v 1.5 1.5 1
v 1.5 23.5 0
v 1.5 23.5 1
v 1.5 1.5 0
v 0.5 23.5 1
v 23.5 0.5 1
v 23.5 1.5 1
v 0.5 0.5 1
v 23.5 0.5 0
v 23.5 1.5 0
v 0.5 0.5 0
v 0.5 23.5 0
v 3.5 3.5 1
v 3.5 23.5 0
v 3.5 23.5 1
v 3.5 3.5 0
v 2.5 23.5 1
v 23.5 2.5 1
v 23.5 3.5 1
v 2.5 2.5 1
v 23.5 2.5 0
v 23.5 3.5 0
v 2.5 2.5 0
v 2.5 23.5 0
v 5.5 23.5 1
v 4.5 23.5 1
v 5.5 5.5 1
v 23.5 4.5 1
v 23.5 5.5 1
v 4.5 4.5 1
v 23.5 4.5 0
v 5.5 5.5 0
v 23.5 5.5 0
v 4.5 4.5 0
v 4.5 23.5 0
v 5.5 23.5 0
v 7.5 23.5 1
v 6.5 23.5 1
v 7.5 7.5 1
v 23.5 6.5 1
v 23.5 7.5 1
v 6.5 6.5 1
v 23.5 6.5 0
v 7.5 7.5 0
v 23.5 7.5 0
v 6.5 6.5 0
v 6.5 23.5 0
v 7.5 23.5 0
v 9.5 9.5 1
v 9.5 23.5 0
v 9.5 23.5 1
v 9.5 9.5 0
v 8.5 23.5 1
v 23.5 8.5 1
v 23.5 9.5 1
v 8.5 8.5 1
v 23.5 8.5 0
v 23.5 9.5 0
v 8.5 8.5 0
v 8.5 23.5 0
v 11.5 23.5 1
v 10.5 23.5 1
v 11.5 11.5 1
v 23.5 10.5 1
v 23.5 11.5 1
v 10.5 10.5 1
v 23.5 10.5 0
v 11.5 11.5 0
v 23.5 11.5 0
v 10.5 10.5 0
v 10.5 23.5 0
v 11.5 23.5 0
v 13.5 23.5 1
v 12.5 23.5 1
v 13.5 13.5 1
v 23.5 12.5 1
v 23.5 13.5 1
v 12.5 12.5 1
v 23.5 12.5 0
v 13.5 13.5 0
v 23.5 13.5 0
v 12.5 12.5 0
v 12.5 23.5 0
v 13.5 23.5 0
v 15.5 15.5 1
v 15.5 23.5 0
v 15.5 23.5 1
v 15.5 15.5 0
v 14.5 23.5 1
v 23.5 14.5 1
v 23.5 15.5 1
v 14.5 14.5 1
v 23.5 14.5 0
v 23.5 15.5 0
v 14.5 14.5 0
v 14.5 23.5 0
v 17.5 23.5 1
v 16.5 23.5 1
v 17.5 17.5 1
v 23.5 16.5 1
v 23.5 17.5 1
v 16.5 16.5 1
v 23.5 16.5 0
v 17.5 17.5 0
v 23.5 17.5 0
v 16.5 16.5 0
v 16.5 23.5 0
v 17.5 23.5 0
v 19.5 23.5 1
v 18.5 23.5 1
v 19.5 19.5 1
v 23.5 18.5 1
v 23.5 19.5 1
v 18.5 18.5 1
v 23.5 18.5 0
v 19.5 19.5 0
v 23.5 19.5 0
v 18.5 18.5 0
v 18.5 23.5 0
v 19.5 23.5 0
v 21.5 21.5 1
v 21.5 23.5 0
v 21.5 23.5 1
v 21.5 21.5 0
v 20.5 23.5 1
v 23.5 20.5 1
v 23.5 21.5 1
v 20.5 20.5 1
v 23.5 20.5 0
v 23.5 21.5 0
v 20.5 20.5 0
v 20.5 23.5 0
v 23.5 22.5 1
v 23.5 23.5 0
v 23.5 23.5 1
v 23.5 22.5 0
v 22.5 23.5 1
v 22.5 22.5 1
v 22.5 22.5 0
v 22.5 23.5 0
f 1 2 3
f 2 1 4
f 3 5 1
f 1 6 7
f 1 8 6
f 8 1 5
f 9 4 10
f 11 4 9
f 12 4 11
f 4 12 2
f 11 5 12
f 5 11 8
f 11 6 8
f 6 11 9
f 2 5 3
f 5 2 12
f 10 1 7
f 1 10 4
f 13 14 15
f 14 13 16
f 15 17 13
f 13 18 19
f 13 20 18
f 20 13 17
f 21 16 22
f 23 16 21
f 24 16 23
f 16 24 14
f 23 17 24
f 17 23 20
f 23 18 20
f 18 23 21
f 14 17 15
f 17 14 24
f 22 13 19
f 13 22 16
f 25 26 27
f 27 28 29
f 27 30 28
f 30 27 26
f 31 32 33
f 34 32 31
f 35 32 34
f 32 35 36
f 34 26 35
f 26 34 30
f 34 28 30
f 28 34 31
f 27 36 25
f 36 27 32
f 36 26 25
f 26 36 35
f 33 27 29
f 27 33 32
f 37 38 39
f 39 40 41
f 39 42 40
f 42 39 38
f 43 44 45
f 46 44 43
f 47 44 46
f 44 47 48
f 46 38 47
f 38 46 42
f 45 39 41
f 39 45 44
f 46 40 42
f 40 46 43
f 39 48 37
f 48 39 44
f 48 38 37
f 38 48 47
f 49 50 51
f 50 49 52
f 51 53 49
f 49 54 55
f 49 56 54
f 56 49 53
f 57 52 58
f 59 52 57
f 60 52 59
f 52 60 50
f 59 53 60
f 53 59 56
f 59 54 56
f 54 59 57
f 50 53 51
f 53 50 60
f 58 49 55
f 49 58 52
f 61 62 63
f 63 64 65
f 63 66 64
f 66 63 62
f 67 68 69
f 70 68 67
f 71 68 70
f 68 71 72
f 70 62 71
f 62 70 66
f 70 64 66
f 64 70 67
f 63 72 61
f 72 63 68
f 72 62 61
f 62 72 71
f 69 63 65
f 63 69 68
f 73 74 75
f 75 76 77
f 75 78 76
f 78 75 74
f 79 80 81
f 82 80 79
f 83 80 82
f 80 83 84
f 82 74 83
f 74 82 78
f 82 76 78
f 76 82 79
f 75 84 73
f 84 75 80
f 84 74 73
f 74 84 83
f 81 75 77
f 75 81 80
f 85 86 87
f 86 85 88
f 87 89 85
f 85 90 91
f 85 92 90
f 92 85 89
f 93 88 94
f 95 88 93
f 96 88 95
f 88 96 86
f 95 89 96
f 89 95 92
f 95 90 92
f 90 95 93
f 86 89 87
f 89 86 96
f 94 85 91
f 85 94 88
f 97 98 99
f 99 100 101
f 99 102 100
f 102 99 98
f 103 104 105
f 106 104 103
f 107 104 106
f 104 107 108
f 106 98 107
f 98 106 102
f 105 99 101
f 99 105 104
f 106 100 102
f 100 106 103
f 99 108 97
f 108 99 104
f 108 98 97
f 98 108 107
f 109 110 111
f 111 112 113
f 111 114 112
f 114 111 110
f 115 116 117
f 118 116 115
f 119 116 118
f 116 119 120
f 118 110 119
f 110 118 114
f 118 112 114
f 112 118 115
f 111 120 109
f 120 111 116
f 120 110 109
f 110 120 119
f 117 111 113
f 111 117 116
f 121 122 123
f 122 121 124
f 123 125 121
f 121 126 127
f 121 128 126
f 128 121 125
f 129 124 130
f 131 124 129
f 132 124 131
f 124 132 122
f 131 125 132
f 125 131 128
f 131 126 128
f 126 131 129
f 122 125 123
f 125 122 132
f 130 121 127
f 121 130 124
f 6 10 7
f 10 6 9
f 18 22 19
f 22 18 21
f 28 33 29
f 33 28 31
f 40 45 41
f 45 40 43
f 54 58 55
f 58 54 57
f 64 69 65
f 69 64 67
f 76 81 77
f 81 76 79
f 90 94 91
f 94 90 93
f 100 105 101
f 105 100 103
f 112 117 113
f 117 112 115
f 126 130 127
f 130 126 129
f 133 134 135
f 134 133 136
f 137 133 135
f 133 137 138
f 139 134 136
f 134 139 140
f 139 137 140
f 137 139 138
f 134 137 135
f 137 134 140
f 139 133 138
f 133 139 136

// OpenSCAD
union() {
    translate([1, 1, 0.5]) cube([1, 1, 1], center=true);
    translate([1, 2, 0.5]) cube([1, 1, 1], center=true);
    translate([1, 3, 0.5]) cube([1, 1, 1], center=true);
    translate([1, 4, 0.5]) cube([1, 1, 1], center=true);
    translate([1, 5, 0.5]) cube([1, 1, 1], center=true);
    translate([1, 6, 0.5]) cube([1, 1, 1], center=true);
    translate([1, 7, 0.5]) cube([1, 1, 1], center=true);
    translate([1, 8, 0.5]) cube([1, 1, 1], center=true);
    translate([1, 9, 0.5]) cube([1, 1, 1], center=true);
    translate([1, 10, 0.5]) cube([1, 1, 1], center=true);
    translate([1, 11, 0.5]) cube([1, 1, 1], center=true);
    translate([1, 12, 0.5]) cube([1, 1, 1], center=true);
    translate([1, 13, 0.5]) cube([1, 1, 1], center=true);
    translate([1, 14, 0.5]) cube([1, 1, 1], center=true);
    translate([1, 15, 0.5]) cube([1, 1, 1], center=true);
    translate([1, 16, 0.5]) cube([1, 1, 1], center=true);
    translate([1, 17, 0.5]) cube([1, 1, 1], center=true);
    translate([1, 18, 0.5]) cube([1, 1, 1], center=true);
    translate([1, 19, 0.5]) cube([1, 1, 1], center=true);
    translate([1, 20, 0.5]) cube([1, 1, 1], center=true);
    translate([1, 21, 0.5]) cube([1, 1, 1], center=true);
    translate([1, 22, 0.5]) cube([1, 1, 1], center=true);
    translate([1, 23, 0.5]) cube([1, 1, 1], center=true);
    translate([2, 1, 0.5]) cube([1, 1, 1], center=true);
    translate([3, 1, 0.5]) cube([1, 1, 1], center=true);
    translate([3, 3, 0.5]) cube([1, 1, 1], center=true);
    translate([3, 4, 0.5]) cube([1, 1, 1], center=true);
    translate([3, 5, 0.5]) cube([1, 1, 1], center=true);
    translate([3, 6, 0.5]) cube([1, 1, 1], center=true);
    translate([3, 7, 0.5]) cube([1, 1, 1], center=true);
    translate([3, 8, 0.5]) cube([1, 1, 1], center=true);
    translate([3, 9, 0.5]) cube([1, 1, 1], center=true);
    translate([3, 10, 0.5]) cube([1, 1, 1], center=true);
    translate([3, 11, 0.5]) cube([1, 1, 1], center=true);
    translate([3, 12, 0.5]) cube([1, 1, 1], center=true);
    translate([3, 13, 0.5]) cube([1, 1, 1], center=true);
    translate([3, 14, 0.5]) cube([1, 1, 1], center=true);
    translate([3, 15, 0.5]) cube([1, 1, 1], center=true);
    translate([3, 16, 0.5]) cube([1, 1, 1], center=true);
    translate([3, 17, 0.5]) cube([1, 1, 1], center=true);
    translate([3, 18, 0.5]) cube([1, 1, 1], center=true);
    translate([3, 19, 0.5]) cube([1, 1, 1], center=true);
    translate([3, 20, 0.5]) cube([1, 1, 1], center=true);
    translate([3, 21, 0.5]) cube([1, 1, 1], center=true);
    translate([3, 22, 0.5]) cube([1, 1, 1], center=true);
    translate([3, 23, 0.5]) cube([1, 1, 1], center=true);
    translate([4, 1, 0.5]) cube([1, 1, 1], center=true);
    translate([4, 3, 0.5]) cube([1, 1, 1], center=true);
    translate([5, 1, 0.5]) cube([1, 1, 1], center=true);
    translate([5, 3, 0.5]) cube([1, 1, 1], center=true);
    translate([5, 5, 0.5]) cube([1, 1, 1], center=true);
    translate([5, 6, 0.5]) cube([1, 1, 1], center=true);
    translate([5, 7, 0.5]) cube([1, 1, 1], center=true);
    translate([5, 8, 0.5]) cube([1, 1, 1], center=true);
    translate([5, 9, 0.5]) cube([1, 1, 1], center=true);
    translate([5, 10, 0.5]) cube([1, 1, 1], center=true);
    translate([5, 11, 0.5]) cube([1, 1, 1], center=true);
    translate([5, 12, 0.5]) cube([1, 1, 1], center=true);
    translate([5, 13, 0.5]) cube([1, 1, 1], center=true);
    translate([5, 14, 0.5]) cube([1, 1, 1], center=true);
    translate([5, 15, 0.5]) cube([1, 1, 1], center=true);
    translate([5, 16, 0.5]) cube([1, 1, 1], center=true);
    translate([5, 17, 0.5]) cube([1, 1, 1], center=true);
    translate([5, 18, 0.5]) cube([1, 1, 1], center=true);
    translate([5, 19, 0.5]) cube([1, 1, 1], center=true);
    translate([5, 20, 0.5]) cube([1, 1, 1], center=true);
    translate([5, 21, 0.5]) cube([1, 1, 1], center=true);
    translate([5, 22, 0.5]) cube([1, 1, 1], center=true);
    translate([5, 23, 0.5]) cube([1, 1, 1], center=true);
    translate([6, 1, 0.5]) cube([1, 1, 1], center=true);
    translate([6, 3, 0.5]) cube([1, 1, 1], center=true);
    translate([6, 5, 0.5]) cube([1, 1, 1], center=true);
    translate([7, 1, 0.5]) cube([1, 1, 1], center=true);
    translate([7, 3, 0.5]) cube([1, 1, 1], center=true);
    translate([7, 5, 0.5]) cube([1, 1, 1], center=true);
    translate([7, 7, 0.5]) cube([1, 1, 1], center=true);
    translate([7, 8, 0.5]) cube([1, 1, 1], center=true);
    translate([7, 9, 0.5]) cube([1, 1, 1], center=true);
    translate([7, 10, 0.5]) cube([1, 1, 1], center=true);
    translate([7, 11, 0.5]) cube([1, 1, 1], center=true);
    translate([7, 12, 0.5]) cube([1, 1, 1], center=true);
    translate([7, 13, 0.5]) cube([1, 1, 1], center=true);
    translate([7, 14, 0.5]) cube([1, 1, 1], center=true);
    translate([7, 15, 0.5]) cube([1, 1, 1], center=true);
    translate([7, 16, 0.5]) cube([1, 1, 1], center=true);
    translate([7, 17, 0.5]) cube([1, 1, 1], center=true);
    translate([7, 18, 0.5]) cube([1, 1, 1], center=true);
    translate([7, 19, 0.5]) cube([1, 1, 1], center=true);
    translate([7, 20, 0.5]) cube([1, 1, 1], center=true);
    translate([7, 21, 0.5]) cube([1, 1, 1], center=true);
    translate([7, 22, 0.5]) cube([1, 1, 1], center=true);
    translate([7, 23, 0.5]) cube([1, 1, 1], center=true);
    translate([8, 1, 0.5]) cube([1, 1, 1], center=true);
    translate([8, 3, 0.5]) cube([1, 1, 1], center=true);
    translate([8, 5, 0.5]) cube([1, 1, 1], center=true);
    translate([8, 7, 0.5]) cube([1, 1, 1], center=true);
    translate([9, 1, 0.5]) cube([1, 1, 1], center=true);
    translate([9, 3, 0.5]) cube([1, 1, 1], center=true);
    translate([9, 5, 0.5]) cube([1, 1, 1], center=true);
    translate([9, 7, 0.5]) cube([1, 1, 1], center=true);
    translate([9, 9, 0.5]) cube([1, 1, 1], center=true);
    translate([9, 10, 0.5]) cube([1, 1, 1], center=true);
    translate([9, 11, 0.5]) cube([1, 1, 1], center=true);
    translate([9, 12, 0.5]) cube([1, 1, 1], center=true);
    translate([9, 13, 0.5]) cube([1, 1, 1], center=true);
    translate([9, 14, 0.5]) cube([1, 1, 1], center=true);
    translate([9, 15, 0.5]) cube([1, 1, 1], center=true);
    translate([9, 16, 0.5]) cube([1, 1, 1], center=true);
    translate([9, 17, 0.5]) cube([1, 1, 1], center=true);
    translate([9, 18, 0.5]) cube([1, 1, 1], center=true);
    translate([9, 19, 0.5]) cube([1, 1, 1], center=true);
    translate([9, 20, 0.5]) cube([1, 1, 1], center=true);
    translate([9, 21, 0.5]) cube([1, 1, 1], center=true);
    translate([9, 22, 0.5]) cube([1, 1, 1], center=true);
    translate([9, 23, 0.5]) cube([1, 1, 1], center=true);
    translate([10, 1, 0.5]) cube([1, 1, 1], center=true);
    translate([10, 3, 0.5]) cube([1, 1, 1], center=true);
    translate([10, 5, 0.5]) cube([1, 1, 1], center=true);
    translate([10, 7, 0.5]) cube([1, 1, 1], center=true);
    translate([10, 9, 0.5]) cube([1, 1, 1], center=true);
    translate([11, 1, 0.5]) cube([1, 1, 1], center=true);
    translate([11, 3, 0.5]) cube([1, 1, 1], center=true);
    translate([11, 5, 0.5]) cube([1, 1, 1], center=true);
    translate([11, 7, 0.5]) cube([1, 1, 1], center=true);
    translate([11, 9, 0.5]) cube([1, 1, 1], center=true);
    translate([11, 11, 0.5]) cube([1, 1, 1], center=true);
    translate([11, 12, 0.5]) cube([1, 1, 1], center=true);
    translate([11, 13, 0.5]) cube([1, 1, 1], center=true);
    translate([11, 14, 0.5]) cube([1, 1, 1], center=true);
    translate([11, 15, 0.5]) cube([1, 1, 1], center=true);
    translate([11, 16, 0.5]) cube([1, 1, 1], center=true);
    translate([11, 17, 0.5]) cube([1, 1, 1], center=true);
    translate([11, 18, 0.5]) cube([1, 1, 1], center=true);
    translate([11, 19, 0.5]) cube([1, 1, 1], center=true);
    translate([11, 20, 0.5]) cube([1, 1, 1], center=true);
    translate([11, 21, 0.5]) cube([1, 1, 1], center=true);
    translate([11, 22, 0.5]) cube([1, 1, 1], center=true);
    translate([11, 23, 0.5]) cube([1, 1, 1], center=true);
    translate([12, 1, 0.5]) cube([1, 1, 1], center=true);
    translate([12, 3, 0.5]) cube([1, 1, 1], center=true);
    translate([12, 5, 0.5]) cube([1, 1, 1], center=true);
    translate([12, 7, 0.5]) cube([1, 1, 1], center=true);
    translate([12, 9, 0.5]) cube([1, 1, 1], center=true);
    translate([12, 11, 0.5]) cube([1, 1, 1], center=true);
    translate([13, 1, 0.5]) cube([1, 1, 1], center=true);
    translate([13, 3, 0.5]) cube([1, 1, 1], center=true);
    translate([13, 5, 0.5]) cube([1, 1, 1], center=true);
    translate([13, 7, 0.5]) cube([1, 1, 1], center=true);
    translate([13, 9, 0.5]) cube([1, 1, 1], center=true);
    translate([13, 11, 0.5]) cube([1, 1, 1], center=true);
    translate([13, 13, 0.5]) cube([1, 1, 1], center=true);
    translate([13, 14, 0.5]) cube([1, 1, 1], center=true);
    translate([13, 15, 0.5]) cube([1, 1, 1], center=true);
    translate([13, 16, 0.5]) cube([1, 1, 1], center=true);
    translate([13, 17, 0.5]) cube([1, 1, 1], center=true);
    translate([13, 18, 0.5]) cube([1, 1, 1], center=true);
    translate([13, 19, 0.5]) cube([1, 1, 1], center=true);
    translate([13, 20, 0.5]) cube([1, 1, 1], center=true);
    translate([13, 21, 0.5]) cube([1, 1, 1], center=true);
    translate([13, 22, 0.5]) cube([1, 1, 1], center=true);
    translate([13, 23, 0.5]) cube([1, 1, 1], center=true);
    translate([14, 1, 0.5]) cube([1, 1, 1], center=true);
    translate([14, 3, 0.5]) cube([1, 1, 1], center=true);
    translate([14, 5, 0.5]) cube([1, 1, 1], center=true);
    translate([14, 7, 0.5]) cube([1, 1, 1], center=true);
    translate([14, 9, 0.5]) cube([1, 1, 1], center=true);
    translate([14, 11, 0.5]) cube([1, 1, 1], center=true);
    translate([14, 13, 0.5]) cube([1, 1, 1], center=true);
    translate([15, 1, 0.5]) cube([1, 1, 1], center=true);
    translate([15, 3, 0.5]) cube([1, 1, 1], center=true);
    translate([15, 5, 0.5]) cube([1, 1, 1], center=true);
    translate([15, 7, 0.5]) cube([1, 1, 1], center=true);
    translate([15, 9, 0.5]) cube([1, 1, 1], center=true);
    translate([15, 11, 0.5]) cube([1, 1, 1], center=true);
    translate([15, 13, 0.5]) cube([1, 1, 1], center=true);
    translate([15, 15, 0.5]) cube([1, 1, 1], center=true);
    translate([15, 16, 0.5]) cube([1, 1, 1], center=true);
    translate([15, 17, 0.5]) cube([1, 1, 1], center=true);
    translate([15, 18, 0.5]) cube([1, 1, 1], center=true);
    translate([15, 19, 0.5]) cube([1, 1, 1], center=true);
    translate([15, 20, 0.5]) cube([1, 1, 1], center=true);
    translate([15, 21, 0.5]) cube([1, 1, 1], center=true);
    translate([15, 22, 0.5]) cube([1, 1, 1], center=true);
    translate([15, 23, 0.5]) cube([1, 1, 1], center=true);
    translate([16, 1, 0.5]) cube([1, 1, 1], center=true);
    translate([16, 3, 0.5]) cube([1, 1, 1], center=true);
    translate([16, 5, 0.5]) cube([1, 1, 1], center=true);
    translate([16, 7, 0.5]) cube([1, 1, 1], center=true);
    translate([16, 9, 0.5]) cube([1, 1, 1], center=true);
    translate([16, 11, 0.5]) cube([1, 1, 1], center=true);
    translate([16, 13, 0.5]) cube([1, 1, 1], center=true);
    translate([16, 15, 0.5]) cube([1, 1, 1], center=true);
    translate([17, 1, 0.5]) cube([1, 1, 1], center=true);
    translate([17, 3, 0.5]) cube([1, 1, 1], center=true);
    translate([17, 5, 0.5]) cube([1, 1, 1], center=true);
    translate([17, 7, 0.5]) cube([1, 1, 1], center=true);
    translate([17, 9, 0.5]) cube([1, 1, 1], center=true);
    translate([17, 11, 0.5]) cube([1, 1, 1], center=true);
    translate([17, 13, 0.5]) cube([1, 1, 1], center=true);
    translate([17, 15, 0.5]) cube([1, 1, 1], center=true);
    translate([17, 17, 0.5]) cube([1, 1, 1], center=true);
    translate([17, 18, 0.5]) cube([1, 1, 1], center=true);
    translate([17, 19, 0.5]) cube([1, 1, 1], center=true);
    translate([17, 20, 0.5]) cube([1, 1, 1], center=true);
    translate([17, 21, 0.5]) cube([1, 1, 1], center=true);
    translate([17, 22, 0.5]) cube([1, 1, 1], center=true);
    translate([17, 23, 0.5]) cube([1, 1, 1], center=true);
    translate([18, 1, 0.5]) cube([1, 1, 1], center=true);
    translate([18, 3, 0.5]) cube([1, 1, 1], center=true);
    translate([18, 5, 0.5]) cube([1, 1, 1], center=true);
    translate([18, 7, 0.5]) cube([1, 1, 1], center=true);
    translate([18, 9, 0.5]) cube([1, 1, 1], center=true);
    translate([18, 11, 0.5]) cube([1, 1, 1], center=true);
    translate([18, 13, 0.5]) cube([1, 1, 1], center=true);
    translate([18, 15, 0.5]) cube([1, 1, 1], center=true);
    translate([18, 17, 0.5]) cube([1, 1, 1], center=true);
    translate([19, 1, 0.5]) cube([1, 1, 1], center=true);
    translate([19, 3, 0.5]) cube([1, 1, 1], center=true);
    translate([19, 5, 0.5]) cube([1, 1, 1], center=true);
    translate([19, 7, 0.5]) cube([1, 1, 1], center=true);
    translate([19, 9, 0.5]) cube([1, 1, 1], center=true);
    translate([19, 11, 0.5]) cube([1, 1, 1], center=true);
    translate([19, 13, 0.5]) cube([1, 1, 1], center=true);
    translate([19, 15, 0.5]) cube([1, 1, 1], center=true);
    translate([19, 17, 0.5]) cube([1, 1, 1], center=true);
    translate([19, 19, 0.5]) cube([1, 1, 1], center=true);
    translate([19, 20, 0.5]) cube([1, 1, 1], center=true);
    translate([19, 21, 0.5]) cube([1, 1, 1], center=true);
    translate([19, 22, 0.5]) cube([1, 1, 1], center=true);
    translate([19, 23, 0.5]) cube([1, 1, 1], center=true);
    translate([20, 1, 0.5]) cube([1, 1, 1], center=true);
    translate([20, 3, 0.5]) cube([1, 1, 1], center=true);
    translate([20, 5, 0.5]) cube([1, 1, 1], center=true);
    translate([20, 7, 0.5]) cube([1, 1, 1], center=true);
    translate([20, 9, 0.5]) cube([1, 1, 1], center=true);
    translate([20, 11, 0.5]) cube([1, 1, 1], center=true);
    translate([20, 13, 0.5]) cube([1, 1, 1], center=true);
    translate([20, 15, 0.5]) cube([1, 1, 1], center=true);
    translate([20, 17, 0.5]) cube([1, 1, 1], center=true);
    translate([20, 19, 0.5]) cube([1, 1, 1], center=true);
    translate([21, 1, 0.5]) cube([1, 1, 1], center=true);
    translate([21, 3, 0.5]) cube([1, 1, 1], center=true);
    translate([21, 5, 0.5]) cube([1, 1, 1], center=true);
    translate([21, 7, 0.5]) cube([1, 1, 1], center=true);
    translate([21, 9, 0.5]) cube([1, 1, 1], center=true);
    translate([21, 11, 0.5]) cube([1, 1, 1], center=true);
    translate([21, 13, 0.5]) cube([1, 1, 1], center=true);
    translate([21, 15, 0.5]) cube([1, 1, 1], center=true);
    translate([21, 17, 0.5]) cube([1, 1, 1], center=true);
    translate([21, 19, 0.5]) cube([1, 1, 1], center=true);
    translate([21, 21, 0.5]) cube([1, 1, 1], center=true);
    translate([21, 22, 0.5]) cube([1, 1, 1], center=true);
    translate([21, 23, 0.5]) cube([1, 1, 1], center=true);
    translate([22, 1, 0.5]) cube([1, 1, 1], center=true);
    translate([22, 3, 0.5]) cube([1, 1, 1], center=true);
    translate([22, 5, 0.5]) cube([1, 1, 1], center=true);
    translate([22, 7, 0.5]) cube([1, 1, 1], center=true);
    translate([22, 9, 0.5]) cube([1, 1, 1], center=true);
    translate([22, 11, 0.5]) cube([1, 1, 1], center=true);
    translate([22, 13, 0.5]) cube([1, 1, 1], center=true);
    translate([22, 15, 0.5]) cube([1, 1, 1], center=true);
    translate([22, 17, 0.5]) cube([1, 1, 1], center=true);
    translate([22, 19, 0.5]) cube([1, 1, 1], center=true);
    translate([22, 21, 0.5]) cube([1, 1, 1], center=true);
    translate([23, 1, 0.5]) cube([1, 1, 1], center=true);
    translate([23, 3, 0.5]) cube([1, 1, 1], center=true);
    translate([23, 5, 0.5]) cube([1, 1, 1], center=true);
    translate([23, 7, 0.5]) cube([1, 1, 1], center=true);
    translate([23, 9, 0.5]) cube([1, 1, 1], center=true);
    translate([23, 11, 0.5]) cube([1, 1, 1], center=true);
    translate([23, 13, 0.5]) cube([1, 1, 1], center=true);
    translate([23, 15, 0.5]) cube([1, 1, 1], center=true);
    translate([23, 17, 0.5]) cube([1, 1, 1], center=true);
    translate([23, 19, 0.5]) cube([1, 1, 1], center=true);
    translate([23, 21, 0.5]) cube([1, 1, 1], center=true);
    translate([23, 23, 0.5]) cube([1, 1, 1], center=true);
}
